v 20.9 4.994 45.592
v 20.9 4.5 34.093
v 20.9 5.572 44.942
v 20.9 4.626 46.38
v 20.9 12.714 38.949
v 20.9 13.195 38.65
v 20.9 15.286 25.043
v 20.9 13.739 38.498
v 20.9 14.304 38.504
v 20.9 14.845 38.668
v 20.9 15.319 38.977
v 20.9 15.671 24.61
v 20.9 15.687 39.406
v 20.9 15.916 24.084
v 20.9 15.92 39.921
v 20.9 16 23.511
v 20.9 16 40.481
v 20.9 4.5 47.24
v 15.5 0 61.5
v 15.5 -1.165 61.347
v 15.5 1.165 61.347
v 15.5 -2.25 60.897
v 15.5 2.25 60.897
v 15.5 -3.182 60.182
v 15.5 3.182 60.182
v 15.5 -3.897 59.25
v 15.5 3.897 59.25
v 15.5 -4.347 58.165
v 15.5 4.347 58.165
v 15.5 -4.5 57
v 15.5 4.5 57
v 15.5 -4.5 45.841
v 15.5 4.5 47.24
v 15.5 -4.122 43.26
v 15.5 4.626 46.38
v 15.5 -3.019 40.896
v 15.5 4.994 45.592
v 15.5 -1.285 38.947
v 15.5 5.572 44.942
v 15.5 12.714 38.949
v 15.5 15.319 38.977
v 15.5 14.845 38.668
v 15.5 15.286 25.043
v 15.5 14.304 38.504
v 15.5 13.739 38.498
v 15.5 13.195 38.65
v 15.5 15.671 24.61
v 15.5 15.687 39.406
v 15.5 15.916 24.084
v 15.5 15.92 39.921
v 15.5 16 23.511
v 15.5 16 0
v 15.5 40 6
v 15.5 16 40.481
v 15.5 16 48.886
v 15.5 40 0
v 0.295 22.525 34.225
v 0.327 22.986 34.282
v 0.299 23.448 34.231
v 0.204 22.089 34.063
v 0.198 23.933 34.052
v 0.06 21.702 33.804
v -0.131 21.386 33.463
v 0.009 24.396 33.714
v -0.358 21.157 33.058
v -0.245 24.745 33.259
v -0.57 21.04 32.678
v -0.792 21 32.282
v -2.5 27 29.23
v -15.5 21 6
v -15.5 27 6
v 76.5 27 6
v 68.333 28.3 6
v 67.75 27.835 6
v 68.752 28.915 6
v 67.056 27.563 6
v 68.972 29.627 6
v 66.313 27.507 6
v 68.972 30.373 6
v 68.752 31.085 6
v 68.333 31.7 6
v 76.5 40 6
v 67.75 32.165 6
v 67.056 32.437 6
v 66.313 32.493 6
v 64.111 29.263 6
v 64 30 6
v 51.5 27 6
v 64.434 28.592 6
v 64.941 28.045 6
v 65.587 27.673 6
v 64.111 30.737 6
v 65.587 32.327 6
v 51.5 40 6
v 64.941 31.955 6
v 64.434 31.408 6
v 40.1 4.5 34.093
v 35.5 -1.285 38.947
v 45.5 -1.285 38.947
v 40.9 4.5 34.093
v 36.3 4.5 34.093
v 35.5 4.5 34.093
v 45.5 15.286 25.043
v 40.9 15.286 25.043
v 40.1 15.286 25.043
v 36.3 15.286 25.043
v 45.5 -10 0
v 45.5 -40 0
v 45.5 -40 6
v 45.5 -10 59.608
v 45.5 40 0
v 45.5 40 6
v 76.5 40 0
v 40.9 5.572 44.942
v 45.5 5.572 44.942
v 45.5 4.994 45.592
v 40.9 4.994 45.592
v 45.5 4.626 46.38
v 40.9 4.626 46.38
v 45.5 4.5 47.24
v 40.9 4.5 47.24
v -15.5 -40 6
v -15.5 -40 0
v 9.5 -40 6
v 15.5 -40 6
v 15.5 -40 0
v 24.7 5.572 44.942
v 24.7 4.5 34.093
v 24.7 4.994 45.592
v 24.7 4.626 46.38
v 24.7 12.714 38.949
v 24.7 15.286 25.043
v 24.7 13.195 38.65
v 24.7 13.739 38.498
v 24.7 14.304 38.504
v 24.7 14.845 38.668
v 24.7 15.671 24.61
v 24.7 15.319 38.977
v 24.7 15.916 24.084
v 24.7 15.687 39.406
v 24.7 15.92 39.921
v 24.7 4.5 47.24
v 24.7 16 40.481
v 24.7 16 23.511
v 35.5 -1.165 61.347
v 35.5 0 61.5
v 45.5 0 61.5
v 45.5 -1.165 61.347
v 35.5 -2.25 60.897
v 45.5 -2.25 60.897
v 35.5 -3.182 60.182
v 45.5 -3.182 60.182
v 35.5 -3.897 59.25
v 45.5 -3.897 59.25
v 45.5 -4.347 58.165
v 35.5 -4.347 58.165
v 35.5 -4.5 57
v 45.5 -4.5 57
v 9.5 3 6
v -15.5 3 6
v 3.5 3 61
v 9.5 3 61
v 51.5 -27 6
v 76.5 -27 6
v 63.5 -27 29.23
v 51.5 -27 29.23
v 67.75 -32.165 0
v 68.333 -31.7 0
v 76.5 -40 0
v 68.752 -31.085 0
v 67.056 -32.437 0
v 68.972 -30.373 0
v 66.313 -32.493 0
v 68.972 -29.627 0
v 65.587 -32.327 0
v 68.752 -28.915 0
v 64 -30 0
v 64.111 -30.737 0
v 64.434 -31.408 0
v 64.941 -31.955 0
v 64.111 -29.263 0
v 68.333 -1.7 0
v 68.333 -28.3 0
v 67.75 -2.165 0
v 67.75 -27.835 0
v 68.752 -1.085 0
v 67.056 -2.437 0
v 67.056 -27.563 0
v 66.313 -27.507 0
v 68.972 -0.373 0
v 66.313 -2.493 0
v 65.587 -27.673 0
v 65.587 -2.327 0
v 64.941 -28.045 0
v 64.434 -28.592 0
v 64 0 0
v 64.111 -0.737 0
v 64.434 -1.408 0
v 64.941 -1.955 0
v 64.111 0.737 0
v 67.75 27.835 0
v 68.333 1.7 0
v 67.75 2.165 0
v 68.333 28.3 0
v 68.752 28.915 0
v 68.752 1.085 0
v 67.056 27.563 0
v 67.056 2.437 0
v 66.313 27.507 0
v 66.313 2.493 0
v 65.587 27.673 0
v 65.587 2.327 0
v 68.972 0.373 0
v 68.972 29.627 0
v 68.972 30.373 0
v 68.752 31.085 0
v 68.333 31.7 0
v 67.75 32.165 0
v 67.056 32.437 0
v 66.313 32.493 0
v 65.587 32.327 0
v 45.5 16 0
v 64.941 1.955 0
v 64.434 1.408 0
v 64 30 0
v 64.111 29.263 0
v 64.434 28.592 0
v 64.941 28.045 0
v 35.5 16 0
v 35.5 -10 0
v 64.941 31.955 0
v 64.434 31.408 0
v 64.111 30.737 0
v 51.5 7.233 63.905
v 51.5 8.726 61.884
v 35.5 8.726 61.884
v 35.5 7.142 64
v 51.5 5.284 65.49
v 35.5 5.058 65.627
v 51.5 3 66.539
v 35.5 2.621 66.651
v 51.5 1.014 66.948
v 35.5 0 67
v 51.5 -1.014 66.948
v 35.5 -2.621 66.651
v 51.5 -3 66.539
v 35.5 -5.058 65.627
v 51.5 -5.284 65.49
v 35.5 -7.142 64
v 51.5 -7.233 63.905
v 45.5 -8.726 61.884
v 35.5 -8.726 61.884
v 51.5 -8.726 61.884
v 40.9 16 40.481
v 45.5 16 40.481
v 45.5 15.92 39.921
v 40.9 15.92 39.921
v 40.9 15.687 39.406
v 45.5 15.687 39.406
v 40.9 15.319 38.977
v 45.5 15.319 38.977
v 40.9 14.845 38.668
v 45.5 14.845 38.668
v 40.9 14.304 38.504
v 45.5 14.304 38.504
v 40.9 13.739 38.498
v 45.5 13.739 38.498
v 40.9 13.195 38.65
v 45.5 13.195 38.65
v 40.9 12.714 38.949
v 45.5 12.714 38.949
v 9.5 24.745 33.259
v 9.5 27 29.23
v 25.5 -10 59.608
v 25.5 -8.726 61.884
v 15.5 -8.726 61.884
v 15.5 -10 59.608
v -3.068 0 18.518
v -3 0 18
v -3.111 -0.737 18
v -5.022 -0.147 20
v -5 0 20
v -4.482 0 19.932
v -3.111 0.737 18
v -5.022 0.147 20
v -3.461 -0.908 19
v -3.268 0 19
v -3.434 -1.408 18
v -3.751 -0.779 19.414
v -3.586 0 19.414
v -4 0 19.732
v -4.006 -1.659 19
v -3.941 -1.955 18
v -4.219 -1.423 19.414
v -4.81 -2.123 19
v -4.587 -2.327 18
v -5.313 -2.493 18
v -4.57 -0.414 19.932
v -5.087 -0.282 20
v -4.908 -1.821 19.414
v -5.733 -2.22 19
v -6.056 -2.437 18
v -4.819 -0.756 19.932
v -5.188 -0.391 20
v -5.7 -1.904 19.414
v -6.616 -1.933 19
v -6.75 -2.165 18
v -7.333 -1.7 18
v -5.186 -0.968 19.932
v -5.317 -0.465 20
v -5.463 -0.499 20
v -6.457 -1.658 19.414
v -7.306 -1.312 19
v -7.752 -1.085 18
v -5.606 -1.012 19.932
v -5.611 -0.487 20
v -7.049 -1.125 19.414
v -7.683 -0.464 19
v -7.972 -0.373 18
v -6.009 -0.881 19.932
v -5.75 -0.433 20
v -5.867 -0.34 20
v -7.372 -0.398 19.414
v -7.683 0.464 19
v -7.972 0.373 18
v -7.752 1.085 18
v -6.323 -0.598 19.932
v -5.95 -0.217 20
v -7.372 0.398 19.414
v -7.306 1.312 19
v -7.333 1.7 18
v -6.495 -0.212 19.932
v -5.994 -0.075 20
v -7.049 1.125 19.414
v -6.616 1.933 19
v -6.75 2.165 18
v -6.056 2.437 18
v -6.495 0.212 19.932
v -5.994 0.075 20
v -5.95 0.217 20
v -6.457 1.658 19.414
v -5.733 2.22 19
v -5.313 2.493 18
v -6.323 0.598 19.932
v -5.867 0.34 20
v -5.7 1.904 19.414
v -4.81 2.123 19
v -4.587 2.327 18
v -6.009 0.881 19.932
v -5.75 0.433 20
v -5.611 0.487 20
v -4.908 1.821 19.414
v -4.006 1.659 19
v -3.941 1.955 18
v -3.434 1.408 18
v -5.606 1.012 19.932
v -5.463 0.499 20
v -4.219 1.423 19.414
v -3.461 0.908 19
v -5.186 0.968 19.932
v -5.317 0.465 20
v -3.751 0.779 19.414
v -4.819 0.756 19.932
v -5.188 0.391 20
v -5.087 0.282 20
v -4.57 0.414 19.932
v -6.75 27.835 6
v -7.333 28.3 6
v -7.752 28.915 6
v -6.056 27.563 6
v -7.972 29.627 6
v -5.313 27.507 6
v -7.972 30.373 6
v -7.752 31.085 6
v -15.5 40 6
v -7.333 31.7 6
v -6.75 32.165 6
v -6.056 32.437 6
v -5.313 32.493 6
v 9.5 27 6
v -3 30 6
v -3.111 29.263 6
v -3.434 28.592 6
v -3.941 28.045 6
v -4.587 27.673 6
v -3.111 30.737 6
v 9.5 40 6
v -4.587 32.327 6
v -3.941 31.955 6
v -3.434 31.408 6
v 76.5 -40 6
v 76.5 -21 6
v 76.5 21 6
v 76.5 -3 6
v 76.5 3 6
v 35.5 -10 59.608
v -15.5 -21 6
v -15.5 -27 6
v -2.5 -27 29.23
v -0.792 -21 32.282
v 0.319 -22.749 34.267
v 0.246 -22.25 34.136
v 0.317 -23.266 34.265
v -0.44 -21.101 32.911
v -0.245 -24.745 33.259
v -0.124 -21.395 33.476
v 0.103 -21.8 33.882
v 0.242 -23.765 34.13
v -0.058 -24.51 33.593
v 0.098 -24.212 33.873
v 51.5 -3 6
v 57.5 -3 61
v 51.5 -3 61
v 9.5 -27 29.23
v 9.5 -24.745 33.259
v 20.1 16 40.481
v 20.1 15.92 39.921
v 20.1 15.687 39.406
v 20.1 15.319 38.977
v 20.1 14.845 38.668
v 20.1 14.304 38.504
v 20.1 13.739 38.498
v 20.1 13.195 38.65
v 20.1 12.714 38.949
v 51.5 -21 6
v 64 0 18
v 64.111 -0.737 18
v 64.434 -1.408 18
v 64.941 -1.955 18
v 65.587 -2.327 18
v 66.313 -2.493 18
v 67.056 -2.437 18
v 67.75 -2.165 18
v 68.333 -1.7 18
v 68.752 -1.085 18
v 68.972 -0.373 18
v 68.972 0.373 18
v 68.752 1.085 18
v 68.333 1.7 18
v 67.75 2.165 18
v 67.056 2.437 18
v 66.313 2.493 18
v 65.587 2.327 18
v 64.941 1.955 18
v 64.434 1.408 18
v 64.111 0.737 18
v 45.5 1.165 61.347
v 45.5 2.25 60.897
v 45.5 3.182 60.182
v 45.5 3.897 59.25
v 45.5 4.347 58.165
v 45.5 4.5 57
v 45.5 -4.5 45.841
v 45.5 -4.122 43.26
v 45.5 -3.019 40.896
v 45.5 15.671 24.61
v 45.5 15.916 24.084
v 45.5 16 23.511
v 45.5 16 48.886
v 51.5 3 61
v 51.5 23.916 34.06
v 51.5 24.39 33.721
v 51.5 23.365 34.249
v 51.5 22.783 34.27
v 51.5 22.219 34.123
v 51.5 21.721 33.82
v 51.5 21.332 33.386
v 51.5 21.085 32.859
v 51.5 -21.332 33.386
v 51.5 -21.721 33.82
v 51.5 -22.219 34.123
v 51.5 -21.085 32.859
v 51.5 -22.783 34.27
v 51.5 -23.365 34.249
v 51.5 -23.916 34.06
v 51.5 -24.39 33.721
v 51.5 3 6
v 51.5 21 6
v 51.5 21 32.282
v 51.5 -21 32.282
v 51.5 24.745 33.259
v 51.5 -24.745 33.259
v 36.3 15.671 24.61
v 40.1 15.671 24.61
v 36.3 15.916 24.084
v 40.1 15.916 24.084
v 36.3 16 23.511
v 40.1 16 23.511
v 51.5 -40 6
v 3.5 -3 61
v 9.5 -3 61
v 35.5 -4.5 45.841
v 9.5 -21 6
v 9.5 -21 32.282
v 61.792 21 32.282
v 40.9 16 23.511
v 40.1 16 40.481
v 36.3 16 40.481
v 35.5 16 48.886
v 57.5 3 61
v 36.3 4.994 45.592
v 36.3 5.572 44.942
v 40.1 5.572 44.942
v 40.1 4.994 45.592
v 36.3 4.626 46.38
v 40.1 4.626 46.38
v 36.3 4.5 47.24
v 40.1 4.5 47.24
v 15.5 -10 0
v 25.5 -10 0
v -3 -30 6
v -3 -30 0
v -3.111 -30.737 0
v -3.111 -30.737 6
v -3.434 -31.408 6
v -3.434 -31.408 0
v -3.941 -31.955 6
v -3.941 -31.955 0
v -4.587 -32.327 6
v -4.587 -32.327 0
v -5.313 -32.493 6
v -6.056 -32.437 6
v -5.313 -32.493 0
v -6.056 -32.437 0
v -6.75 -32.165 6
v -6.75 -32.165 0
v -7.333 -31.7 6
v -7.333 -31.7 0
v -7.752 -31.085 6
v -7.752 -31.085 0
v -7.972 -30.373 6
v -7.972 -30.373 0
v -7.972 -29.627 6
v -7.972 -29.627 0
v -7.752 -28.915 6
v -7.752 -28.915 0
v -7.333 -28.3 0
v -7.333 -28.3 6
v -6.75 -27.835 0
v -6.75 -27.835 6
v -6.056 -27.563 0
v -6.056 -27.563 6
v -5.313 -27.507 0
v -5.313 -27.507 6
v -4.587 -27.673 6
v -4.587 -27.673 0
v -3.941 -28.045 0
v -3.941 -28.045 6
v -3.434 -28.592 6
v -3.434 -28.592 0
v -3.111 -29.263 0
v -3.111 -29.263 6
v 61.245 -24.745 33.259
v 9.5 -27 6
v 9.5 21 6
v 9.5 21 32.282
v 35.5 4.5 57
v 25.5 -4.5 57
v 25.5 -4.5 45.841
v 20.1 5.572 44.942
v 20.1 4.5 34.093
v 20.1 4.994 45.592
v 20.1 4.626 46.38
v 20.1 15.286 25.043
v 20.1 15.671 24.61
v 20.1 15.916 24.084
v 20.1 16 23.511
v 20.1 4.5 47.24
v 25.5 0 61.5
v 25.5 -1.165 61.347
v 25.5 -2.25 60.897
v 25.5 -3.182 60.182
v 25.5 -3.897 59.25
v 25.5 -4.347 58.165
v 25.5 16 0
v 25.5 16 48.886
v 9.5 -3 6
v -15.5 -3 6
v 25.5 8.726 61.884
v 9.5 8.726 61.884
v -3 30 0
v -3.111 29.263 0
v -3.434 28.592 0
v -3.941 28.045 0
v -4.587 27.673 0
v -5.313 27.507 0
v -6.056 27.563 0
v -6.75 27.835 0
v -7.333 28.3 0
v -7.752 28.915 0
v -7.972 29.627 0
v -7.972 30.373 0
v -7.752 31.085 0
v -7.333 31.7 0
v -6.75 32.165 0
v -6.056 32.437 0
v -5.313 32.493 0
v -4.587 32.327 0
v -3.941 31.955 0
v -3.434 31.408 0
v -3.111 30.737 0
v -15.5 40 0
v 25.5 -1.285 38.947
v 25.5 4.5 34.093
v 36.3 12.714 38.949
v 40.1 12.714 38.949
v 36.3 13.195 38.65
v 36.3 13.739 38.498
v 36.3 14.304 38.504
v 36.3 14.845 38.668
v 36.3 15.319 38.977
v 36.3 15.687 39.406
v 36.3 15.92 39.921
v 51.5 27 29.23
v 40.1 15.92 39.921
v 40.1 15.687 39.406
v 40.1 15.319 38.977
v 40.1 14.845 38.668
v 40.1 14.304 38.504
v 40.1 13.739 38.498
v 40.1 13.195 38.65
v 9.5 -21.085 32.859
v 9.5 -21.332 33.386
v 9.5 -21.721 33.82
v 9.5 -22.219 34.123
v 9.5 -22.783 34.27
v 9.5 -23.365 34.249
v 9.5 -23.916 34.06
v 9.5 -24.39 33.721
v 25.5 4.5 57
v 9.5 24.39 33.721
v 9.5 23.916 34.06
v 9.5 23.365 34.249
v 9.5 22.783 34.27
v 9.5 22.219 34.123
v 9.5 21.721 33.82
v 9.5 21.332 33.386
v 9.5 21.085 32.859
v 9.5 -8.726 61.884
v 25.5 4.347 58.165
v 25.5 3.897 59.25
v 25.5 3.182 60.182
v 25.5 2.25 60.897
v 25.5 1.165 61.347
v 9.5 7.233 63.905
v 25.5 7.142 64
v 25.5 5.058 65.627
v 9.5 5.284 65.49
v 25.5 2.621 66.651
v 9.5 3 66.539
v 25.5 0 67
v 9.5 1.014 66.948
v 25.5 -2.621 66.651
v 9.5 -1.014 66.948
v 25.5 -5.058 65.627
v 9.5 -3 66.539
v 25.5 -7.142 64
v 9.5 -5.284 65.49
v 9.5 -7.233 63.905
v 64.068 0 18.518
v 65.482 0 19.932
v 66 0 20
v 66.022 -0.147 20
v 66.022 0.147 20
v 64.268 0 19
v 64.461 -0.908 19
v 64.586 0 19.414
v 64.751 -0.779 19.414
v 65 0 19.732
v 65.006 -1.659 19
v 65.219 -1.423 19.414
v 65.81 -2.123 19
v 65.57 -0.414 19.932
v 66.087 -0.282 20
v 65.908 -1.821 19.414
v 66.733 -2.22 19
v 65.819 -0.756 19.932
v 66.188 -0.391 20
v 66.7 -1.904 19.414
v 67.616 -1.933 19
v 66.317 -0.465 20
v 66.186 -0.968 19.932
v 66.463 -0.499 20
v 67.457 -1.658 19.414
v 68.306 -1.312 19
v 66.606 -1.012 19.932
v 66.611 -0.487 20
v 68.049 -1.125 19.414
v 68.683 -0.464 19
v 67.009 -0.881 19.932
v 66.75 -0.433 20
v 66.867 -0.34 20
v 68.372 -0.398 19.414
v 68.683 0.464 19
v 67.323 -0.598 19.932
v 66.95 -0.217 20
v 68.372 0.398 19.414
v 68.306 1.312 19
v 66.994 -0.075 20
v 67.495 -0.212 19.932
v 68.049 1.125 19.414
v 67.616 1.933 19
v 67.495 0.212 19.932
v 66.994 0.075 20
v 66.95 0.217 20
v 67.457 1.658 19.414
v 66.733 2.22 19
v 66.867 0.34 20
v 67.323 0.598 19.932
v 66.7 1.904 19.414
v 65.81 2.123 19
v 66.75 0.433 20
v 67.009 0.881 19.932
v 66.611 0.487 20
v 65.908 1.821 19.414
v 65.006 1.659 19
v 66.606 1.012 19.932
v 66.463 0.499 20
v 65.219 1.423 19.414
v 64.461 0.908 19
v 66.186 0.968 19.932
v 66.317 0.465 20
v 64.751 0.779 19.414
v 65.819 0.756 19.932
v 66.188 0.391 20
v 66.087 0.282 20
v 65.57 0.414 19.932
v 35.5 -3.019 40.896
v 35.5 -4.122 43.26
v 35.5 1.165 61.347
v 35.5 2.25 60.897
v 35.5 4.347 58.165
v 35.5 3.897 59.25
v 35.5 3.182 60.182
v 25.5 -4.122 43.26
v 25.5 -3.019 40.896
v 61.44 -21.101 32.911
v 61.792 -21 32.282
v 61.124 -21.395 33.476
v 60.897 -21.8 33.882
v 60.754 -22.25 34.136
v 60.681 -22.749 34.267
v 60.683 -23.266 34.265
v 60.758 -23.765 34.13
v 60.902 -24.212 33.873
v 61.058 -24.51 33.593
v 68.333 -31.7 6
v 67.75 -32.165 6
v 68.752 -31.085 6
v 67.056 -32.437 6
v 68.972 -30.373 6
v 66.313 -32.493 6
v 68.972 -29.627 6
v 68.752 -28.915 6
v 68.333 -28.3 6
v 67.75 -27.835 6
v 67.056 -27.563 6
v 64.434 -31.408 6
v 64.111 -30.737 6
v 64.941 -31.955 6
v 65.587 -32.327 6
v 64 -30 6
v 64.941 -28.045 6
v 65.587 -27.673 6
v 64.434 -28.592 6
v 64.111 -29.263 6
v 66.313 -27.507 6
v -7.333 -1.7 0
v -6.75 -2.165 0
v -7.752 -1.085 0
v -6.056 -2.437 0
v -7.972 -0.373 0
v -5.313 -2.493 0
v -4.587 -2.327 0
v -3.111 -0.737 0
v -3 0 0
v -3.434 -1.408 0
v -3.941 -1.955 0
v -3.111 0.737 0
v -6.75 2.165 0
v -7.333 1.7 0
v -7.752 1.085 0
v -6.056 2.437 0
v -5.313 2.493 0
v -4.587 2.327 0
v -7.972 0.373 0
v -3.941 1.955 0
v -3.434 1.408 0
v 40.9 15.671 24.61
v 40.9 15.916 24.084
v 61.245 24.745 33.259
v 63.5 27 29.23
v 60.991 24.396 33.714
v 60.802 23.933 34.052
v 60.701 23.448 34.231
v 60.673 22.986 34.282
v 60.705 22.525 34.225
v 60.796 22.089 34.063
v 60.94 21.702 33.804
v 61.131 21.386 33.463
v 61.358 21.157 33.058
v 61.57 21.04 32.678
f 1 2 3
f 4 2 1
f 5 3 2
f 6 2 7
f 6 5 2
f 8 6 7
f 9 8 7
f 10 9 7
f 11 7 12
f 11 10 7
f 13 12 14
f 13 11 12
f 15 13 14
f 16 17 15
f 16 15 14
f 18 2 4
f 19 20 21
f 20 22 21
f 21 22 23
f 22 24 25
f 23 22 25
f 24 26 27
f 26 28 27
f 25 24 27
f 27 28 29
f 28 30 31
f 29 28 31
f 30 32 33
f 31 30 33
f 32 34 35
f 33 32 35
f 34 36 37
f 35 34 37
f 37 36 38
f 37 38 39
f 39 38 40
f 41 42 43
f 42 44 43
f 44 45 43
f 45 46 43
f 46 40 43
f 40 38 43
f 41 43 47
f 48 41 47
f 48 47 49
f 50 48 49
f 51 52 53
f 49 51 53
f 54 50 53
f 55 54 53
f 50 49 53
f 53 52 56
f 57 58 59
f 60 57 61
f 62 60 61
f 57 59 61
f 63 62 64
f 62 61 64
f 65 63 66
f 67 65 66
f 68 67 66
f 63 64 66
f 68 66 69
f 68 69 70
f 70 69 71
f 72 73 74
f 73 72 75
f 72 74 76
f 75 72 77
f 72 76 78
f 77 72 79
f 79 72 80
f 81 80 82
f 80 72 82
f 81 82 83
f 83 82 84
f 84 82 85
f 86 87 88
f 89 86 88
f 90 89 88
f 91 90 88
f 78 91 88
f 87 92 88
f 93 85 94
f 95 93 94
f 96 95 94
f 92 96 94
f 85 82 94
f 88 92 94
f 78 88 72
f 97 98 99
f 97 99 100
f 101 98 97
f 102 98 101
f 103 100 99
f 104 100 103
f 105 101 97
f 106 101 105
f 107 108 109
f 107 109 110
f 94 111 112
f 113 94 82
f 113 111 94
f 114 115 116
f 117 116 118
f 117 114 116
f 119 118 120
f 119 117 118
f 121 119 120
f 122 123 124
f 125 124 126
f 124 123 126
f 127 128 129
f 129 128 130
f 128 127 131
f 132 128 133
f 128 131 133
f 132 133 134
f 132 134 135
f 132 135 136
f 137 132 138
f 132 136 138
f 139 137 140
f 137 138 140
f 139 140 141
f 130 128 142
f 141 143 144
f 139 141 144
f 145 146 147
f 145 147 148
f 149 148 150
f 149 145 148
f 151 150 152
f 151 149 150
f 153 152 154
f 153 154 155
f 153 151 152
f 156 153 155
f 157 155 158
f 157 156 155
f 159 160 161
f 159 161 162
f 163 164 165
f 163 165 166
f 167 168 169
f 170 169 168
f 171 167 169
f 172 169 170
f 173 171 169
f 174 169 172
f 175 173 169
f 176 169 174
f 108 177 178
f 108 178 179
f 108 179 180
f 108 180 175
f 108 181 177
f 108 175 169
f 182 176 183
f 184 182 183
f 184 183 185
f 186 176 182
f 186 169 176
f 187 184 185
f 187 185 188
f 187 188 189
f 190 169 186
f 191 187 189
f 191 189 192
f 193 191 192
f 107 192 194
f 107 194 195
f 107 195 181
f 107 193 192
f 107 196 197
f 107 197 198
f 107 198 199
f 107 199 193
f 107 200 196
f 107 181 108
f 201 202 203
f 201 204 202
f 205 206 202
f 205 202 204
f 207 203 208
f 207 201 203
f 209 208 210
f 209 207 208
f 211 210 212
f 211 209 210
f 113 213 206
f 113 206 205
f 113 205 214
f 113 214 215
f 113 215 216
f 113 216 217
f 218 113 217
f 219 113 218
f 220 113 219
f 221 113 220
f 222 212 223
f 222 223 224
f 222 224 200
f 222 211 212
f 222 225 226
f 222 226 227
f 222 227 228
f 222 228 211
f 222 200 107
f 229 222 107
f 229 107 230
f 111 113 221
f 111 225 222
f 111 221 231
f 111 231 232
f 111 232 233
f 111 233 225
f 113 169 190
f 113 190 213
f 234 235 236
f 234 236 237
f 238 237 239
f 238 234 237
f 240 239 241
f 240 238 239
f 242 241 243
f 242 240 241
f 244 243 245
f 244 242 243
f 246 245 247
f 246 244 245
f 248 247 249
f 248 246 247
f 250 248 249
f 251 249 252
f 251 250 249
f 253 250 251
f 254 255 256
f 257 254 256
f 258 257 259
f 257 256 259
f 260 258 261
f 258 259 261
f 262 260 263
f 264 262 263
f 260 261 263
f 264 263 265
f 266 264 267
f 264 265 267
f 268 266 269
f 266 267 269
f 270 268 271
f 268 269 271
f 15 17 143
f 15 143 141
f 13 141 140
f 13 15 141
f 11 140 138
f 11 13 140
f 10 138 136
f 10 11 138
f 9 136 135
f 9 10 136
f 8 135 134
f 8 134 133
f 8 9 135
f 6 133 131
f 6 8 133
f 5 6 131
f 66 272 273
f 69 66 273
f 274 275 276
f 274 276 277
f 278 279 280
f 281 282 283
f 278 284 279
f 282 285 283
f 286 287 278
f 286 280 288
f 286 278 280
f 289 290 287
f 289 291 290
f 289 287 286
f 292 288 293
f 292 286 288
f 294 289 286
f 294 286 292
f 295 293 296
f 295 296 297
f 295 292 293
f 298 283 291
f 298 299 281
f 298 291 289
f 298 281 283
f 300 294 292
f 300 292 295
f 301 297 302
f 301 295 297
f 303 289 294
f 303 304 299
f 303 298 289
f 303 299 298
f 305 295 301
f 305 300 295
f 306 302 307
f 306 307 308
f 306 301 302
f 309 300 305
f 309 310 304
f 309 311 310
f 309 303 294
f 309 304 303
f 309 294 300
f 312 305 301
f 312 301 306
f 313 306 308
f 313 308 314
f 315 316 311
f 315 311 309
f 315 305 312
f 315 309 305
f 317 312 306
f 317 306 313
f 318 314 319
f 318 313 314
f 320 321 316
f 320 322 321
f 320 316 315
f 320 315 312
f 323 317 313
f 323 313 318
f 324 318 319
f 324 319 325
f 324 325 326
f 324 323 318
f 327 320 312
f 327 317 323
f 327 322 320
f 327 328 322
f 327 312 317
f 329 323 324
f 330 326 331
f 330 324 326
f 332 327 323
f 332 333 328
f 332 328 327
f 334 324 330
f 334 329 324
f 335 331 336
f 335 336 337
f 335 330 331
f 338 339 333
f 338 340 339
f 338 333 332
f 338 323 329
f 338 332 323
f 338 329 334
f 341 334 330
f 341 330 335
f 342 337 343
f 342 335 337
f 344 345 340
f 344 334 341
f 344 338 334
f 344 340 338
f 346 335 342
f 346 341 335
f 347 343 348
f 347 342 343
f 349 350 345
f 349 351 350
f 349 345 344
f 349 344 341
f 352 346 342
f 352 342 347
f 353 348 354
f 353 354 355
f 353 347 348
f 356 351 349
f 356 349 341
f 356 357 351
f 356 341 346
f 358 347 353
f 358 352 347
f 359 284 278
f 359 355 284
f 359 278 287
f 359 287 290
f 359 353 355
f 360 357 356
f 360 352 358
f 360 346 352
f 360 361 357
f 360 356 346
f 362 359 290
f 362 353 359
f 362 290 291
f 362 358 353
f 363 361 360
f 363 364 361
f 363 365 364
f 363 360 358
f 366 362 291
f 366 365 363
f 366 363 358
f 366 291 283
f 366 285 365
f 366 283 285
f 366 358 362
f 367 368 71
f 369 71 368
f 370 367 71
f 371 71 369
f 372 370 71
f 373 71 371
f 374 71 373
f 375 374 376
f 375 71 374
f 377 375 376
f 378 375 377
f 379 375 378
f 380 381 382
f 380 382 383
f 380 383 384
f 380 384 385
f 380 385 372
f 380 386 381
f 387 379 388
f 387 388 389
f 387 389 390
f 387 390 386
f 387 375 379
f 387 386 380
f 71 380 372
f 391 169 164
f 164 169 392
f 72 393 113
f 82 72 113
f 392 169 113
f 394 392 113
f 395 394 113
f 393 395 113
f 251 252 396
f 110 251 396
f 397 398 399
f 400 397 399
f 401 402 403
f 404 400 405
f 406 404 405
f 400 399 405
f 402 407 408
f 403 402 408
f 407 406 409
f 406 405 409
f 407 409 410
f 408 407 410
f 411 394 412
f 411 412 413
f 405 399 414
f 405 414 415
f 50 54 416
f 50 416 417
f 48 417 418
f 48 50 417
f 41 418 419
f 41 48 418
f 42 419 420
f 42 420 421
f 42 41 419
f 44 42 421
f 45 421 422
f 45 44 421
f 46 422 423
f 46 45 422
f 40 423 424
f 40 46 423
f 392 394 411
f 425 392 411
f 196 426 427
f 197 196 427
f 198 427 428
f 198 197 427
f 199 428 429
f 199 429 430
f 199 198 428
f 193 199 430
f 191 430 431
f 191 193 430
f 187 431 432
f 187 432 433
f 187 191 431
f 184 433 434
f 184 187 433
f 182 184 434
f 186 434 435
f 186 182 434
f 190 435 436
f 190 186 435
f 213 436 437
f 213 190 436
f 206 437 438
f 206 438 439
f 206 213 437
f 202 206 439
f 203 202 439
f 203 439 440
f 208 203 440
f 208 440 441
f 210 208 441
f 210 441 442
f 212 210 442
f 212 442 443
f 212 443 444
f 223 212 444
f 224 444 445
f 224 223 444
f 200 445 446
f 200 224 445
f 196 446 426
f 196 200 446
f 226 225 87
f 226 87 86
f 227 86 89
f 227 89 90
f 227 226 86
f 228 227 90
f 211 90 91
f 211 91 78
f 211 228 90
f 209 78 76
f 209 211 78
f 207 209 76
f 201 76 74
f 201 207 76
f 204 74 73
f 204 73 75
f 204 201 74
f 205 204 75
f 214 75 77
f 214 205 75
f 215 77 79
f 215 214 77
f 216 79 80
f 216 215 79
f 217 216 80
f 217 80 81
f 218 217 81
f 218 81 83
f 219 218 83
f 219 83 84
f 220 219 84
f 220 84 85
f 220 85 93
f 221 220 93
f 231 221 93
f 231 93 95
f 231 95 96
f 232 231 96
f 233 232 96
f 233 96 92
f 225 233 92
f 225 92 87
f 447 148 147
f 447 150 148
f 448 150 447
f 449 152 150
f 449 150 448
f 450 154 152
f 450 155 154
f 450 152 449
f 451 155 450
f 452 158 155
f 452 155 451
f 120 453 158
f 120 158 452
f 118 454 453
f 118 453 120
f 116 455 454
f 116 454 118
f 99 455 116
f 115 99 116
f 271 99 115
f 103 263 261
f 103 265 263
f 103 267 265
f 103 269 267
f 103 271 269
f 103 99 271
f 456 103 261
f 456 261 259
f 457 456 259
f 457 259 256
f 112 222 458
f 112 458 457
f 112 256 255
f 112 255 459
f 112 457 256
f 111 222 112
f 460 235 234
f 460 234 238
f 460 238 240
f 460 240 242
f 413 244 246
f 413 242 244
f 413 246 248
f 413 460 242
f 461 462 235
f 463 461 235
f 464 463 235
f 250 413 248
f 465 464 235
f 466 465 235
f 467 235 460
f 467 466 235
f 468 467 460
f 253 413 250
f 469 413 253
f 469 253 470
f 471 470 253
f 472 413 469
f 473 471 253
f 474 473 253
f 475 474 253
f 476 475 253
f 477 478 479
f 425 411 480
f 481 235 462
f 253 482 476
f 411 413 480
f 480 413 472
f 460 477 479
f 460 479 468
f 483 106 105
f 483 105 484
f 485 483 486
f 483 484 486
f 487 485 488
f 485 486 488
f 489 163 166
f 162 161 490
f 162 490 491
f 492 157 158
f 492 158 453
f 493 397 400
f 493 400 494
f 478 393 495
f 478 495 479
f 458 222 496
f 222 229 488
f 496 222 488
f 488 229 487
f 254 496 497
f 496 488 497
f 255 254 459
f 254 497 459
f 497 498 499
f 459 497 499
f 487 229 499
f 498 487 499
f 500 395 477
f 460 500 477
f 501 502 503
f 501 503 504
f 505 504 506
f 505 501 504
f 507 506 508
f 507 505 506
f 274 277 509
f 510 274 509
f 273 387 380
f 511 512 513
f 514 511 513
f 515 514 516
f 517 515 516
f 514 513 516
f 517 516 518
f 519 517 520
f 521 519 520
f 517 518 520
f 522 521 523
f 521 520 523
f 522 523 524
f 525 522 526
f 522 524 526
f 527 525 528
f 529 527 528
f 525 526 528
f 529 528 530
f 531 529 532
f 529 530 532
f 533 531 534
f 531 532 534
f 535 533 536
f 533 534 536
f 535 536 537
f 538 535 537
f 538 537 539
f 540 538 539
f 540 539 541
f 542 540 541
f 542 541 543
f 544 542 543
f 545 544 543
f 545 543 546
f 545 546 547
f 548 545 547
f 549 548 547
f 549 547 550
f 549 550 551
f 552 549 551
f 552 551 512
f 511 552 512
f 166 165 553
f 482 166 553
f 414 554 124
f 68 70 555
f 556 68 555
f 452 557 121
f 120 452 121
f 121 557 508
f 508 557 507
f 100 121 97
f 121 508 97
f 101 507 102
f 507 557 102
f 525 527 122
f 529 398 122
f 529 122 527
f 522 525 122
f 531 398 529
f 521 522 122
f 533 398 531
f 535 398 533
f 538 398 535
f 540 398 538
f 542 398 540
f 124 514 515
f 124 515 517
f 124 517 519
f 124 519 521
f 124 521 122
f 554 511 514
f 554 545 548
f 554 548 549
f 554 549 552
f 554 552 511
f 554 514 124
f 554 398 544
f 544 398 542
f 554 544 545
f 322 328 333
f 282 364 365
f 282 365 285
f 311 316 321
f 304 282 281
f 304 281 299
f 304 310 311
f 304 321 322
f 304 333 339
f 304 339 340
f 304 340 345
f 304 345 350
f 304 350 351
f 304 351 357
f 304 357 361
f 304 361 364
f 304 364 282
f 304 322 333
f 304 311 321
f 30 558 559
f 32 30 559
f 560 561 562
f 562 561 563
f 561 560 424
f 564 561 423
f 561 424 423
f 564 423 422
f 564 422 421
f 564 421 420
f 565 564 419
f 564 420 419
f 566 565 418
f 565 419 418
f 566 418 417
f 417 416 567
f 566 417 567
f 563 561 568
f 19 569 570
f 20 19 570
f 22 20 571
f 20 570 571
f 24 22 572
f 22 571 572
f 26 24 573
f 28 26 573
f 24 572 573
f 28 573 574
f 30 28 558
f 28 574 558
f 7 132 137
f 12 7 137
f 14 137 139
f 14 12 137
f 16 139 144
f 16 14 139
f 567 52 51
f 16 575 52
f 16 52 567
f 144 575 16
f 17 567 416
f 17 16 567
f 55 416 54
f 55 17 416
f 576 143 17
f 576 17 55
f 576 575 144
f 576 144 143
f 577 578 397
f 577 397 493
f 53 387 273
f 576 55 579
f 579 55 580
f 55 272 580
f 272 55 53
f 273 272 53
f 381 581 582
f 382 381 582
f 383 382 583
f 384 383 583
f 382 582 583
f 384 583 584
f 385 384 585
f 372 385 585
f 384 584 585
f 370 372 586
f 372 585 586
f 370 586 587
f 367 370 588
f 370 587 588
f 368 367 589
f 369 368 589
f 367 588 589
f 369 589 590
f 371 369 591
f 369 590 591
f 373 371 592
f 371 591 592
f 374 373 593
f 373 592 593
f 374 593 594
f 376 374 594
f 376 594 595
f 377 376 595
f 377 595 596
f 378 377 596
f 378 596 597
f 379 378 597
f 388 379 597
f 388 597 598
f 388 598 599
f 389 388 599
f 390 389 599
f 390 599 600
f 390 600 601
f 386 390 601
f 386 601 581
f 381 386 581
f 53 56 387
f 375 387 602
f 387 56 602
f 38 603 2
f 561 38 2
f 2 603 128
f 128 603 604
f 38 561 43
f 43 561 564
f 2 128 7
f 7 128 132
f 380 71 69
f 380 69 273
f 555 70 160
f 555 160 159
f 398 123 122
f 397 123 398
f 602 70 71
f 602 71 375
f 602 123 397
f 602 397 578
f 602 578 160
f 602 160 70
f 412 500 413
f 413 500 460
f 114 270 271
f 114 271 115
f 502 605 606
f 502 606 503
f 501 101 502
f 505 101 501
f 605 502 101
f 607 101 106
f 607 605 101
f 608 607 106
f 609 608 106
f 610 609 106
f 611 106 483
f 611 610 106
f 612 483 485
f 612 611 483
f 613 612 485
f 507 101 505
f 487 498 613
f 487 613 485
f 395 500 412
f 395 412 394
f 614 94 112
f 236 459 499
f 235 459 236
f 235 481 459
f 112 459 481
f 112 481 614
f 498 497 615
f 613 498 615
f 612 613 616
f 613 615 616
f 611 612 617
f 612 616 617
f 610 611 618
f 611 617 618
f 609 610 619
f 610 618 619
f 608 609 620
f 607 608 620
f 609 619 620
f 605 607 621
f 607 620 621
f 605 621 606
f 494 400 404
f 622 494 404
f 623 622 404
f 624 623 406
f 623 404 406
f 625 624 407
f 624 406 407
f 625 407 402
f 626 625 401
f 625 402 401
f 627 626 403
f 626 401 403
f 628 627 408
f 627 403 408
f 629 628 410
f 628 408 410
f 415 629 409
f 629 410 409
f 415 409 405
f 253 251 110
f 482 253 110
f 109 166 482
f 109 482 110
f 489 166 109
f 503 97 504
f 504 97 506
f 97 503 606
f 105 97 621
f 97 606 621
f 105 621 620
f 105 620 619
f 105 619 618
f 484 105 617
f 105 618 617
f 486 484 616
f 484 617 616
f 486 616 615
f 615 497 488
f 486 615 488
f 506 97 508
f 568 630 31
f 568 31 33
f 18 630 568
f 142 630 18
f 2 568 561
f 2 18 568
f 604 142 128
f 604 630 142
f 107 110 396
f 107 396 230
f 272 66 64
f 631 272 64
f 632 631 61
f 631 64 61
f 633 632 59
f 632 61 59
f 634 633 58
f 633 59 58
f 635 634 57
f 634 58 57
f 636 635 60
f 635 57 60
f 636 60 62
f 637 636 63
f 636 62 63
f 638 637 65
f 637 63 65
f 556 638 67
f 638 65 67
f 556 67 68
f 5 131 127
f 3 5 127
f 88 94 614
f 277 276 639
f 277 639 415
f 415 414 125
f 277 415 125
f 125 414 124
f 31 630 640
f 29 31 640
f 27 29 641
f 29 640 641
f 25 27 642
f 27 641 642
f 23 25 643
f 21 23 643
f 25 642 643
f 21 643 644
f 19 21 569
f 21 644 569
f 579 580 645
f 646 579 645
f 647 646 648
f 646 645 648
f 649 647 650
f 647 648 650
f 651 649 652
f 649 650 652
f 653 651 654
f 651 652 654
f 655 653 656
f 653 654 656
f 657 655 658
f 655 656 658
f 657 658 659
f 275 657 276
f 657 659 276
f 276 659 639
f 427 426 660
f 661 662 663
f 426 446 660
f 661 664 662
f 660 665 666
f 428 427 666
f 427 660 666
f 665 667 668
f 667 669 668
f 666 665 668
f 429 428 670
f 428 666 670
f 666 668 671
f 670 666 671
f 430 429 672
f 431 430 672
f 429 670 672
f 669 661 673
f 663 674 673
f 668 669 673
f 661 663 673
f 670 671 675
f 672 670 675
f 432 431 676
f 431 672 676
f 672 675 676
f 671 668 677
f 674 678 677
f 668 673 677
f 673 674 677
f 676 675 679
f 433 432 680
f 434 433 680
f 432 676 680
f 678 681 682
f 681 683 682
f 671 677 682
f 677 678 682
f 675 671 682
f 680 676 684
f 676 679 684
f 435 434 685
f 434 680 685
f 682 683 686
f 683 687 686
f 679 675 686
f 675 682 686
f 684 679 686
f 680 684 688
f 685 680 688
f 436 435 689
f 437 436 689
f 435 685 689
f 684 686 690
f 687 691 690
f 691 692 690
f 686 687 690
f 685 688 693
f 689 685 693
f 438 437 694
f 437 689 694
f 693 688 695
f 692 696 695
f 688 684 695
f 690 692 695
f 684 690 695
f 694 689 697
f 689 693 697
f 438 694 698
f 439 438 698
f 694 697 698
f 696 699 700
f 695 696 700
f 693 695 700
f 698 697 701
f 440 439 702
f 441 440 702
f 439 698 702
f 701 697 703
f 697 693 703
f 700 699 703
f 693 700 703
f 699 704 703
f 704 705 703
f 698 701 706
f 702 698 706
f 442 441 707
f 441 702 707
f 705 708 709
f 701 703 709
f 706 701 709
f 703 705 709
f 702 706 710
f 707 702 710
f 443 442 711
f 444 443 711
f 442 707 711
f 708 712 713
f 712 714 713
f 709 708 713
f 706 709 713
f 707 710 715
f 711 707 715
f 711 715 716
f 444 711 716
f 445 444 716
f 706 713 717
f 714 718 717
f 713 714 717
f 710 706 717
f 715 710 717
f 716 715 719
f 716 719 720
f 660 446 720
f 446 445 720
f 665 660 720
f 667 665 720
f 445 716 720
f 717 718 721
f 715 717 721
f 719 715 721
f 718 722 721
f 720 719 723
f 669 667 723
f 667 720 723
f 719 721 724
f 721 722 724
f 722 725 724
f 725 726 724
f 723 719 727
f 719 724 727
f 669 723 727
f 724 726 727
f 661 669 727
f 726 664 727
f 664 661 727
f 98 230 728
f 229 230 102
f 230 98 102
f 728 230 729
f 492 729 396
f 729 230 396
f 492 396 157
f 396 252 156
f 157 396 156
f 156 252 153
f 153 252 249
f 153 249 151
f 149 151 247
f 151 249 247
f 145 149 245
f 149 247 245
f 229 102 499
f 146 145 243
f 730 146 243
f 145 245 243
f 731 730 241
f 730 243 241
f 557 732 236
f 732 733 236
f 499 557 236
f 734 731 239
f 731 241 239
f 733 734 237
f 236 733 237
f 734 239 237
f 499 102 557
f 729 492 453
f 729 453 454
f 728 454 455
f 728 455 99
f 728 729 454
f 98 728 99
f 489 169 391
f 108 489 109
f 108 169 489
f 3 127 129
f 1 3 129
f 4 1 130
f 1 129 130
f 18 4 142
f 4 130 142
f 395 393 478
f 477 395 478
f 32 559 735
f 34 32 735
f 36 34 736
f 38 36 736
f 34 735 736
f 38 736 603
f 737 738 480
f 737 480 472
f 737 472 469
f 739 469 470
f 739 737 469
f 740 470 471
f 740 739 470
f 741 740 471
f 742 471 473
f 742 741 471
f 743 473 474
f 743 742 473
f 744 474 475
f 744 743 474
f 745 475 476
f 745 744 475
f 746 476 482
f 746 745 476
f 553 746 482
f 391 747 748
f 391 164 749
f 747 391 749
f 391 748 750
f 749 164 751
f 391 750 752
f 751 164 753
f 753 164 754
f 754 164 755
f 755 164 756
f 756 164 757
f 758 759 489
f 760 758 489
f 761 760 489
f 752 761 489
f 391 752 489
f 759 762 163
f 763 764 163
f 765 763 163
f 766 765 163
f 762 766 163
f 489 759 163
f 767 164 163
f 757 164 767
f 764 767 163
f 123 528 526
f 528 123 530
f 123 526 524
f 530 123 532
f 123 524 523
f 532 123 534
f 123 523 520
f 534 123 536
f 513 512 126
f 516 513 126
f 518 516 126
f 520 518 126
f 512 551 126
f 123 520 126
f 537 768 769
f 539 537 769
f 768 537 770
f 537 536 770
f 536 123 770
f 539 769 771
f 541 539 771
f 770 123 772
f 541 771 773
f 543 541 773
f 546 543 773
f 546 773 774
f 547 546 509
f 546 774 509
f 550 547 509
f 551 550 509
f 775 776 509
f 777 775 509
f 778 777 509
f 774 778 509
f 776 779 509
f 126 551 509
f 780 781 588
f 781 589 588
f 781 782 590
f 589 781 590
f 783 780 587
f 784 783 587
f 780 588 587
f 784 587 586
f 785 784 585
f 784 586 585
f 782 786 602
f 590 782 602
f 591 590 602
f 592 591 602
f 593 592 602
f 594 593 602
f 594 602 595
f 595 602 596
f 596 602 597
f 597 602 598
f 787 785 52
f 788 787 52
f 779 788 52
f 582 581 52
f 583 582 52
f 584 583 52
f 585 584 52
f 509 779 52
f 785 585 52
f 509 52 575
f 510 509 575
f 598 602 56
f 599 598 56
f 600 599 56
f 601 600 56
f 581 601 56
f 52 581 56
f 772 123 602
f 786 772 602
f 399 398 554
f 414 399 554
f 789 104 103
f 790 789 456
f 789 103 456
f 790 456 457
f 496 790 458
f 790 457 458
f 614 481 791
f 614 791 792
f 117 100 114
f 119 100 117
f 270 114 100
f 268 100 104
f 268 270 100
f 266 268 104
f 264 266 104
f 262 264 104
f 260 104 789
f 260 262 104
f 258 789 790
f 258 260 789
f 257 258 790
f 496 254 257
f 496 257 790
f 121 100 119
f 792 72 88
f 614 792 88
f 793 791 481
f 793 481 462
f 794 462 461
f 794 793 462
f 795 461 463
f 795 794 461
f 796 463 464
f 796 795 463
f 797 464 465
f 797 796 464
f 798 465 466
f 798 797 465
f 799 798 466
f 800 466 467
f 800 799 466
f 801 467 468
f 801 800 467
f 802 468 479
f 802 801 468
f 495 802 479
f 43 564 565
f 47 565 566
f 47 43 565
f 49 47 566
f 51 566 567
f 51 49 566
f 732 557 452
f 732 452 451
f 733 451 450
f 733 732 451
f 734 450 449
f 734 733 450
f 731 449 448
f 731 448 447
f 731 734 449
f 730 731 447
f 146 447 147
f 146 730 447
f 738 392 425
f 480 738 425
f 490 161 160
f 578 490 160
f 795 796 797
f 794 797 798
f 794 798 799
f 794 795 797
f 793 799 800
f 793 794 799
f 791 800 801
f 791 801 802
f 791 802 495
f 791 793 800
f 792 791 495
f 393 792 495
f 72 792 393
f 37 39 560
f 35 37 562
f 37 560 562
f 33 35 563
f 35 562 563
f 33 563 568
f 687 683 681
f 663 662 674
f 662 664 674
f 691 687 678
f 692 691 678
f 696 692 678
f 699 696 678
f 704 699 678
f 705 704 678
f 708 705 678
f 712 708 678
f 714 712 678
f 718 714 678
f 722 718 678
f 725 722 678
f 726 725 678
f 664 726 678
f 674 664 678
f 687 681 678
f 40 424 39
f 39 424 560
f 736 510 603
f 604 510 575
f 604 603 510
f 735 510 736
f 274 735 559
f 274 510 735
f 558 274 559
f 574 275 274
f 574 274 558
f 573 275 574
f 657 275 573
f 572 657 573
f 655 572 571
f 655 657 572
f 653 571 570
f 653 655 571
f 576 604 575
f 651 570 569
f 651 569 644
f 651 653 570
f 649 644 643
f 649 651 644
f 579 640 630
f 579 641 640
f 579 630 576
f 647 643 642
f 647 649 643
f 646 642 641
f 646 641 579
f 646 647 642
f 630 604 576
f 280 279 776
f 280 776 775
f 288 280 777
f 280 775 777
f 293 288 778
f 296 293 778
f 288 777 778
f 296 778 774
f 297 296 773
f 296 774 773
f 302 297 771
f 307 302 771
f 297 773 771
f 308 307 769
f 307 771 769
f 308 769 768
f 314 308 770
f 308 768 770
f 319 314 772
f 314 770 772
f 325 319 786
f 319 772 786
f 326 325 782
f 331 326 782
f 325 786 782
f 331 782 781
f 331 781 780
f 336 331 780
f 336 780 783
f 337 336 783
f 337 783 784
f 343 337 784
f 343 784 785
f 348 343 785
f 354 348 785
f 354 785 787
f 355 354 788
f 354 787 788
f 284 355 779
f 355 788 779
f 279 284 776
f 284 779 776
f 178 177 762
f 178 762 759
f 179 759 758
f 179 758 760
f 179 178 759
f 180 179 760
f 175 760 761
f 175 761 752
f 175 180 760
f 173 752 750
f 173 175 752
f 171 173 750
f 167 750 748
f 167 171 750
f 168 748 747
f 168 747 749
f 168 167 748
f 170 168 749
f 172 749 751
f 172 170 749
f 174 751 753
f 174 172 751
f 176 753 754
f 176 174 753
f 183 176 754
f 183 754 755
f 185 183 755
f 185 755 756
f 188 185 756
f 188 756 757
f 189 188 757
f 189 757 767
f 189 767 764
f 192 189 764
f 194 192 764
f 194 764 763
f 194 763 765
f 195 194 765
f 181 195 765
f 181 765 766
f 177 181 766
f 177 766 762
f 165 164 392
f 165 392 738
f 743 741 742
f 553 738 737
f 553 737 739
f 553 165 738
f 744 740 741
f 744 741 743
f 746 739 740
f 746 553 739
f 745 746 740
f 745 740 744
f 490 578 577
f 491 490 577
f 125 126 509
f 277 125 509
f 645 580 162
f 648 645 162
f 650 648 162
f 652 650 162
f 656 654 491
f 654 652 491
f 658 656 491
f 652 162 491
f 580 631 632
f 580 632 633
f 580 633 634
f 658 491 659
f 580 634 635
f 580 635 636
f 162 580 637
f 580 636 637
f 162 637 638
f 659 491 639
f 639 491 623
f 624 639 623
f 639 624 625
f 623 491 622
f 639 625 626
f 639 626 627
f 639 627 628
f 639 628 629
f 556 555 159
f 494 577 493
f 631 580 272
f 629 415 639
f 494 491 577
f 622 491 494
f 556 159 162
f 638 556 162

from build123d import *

# Parameters (mm, degrees)
F1_DEPTH       = 6
F3_DEPTH       = 61
F5_DEPTH       = 25
F6_W           = 25
F6_H           = 6
F7_DEPTH       = 55
F9_DEPTH       = 66
F11_DEPTH      = 10
F13_DEPTH      = 10
F14_R          = 2
F17_DEPTH      = 0.4
F17_DEPTH_BACK = 0.4
F19_DEPTH      = 0.8
F20_R          = 2.5
F21_DEPTH      = 20
F22_R          = 2
F24_DEPTH      = 14.1
F26_DEPTH      = 9.9
F28_DEPTH      = 6.1
F29_T1_DEPTH   = 25.1731750977


# Not quite as in the source:
# - a fillet or chamfer that OpenCascade refuses, or shapes differently, is made with other operations: its cross-section is extruded or revolved along the edge and cut away or added


with BuildPart() as f1:
    # F0 (on Top) → F1 (new body)
    with BuildSketch(Plane.XY):
        Polygon((15.5, 40), (-15.5, 40), (-15.5, -40), (15.5, -40), (15.5, -10), (25.5, -10), (25.5, 16), (15.5, 16), align=None)
    extrude(amount=F1_DEPTH)

    # F2 (on face) → F3 (join)
    with BuildSketch(Plane.XY.offset(6)):
        Polygon((15.5, 16), (15.5, 40), (9.5, 40), (9.5, -40), (15.5, -40), (15.5, -10), align=None)
    extrude(amount=F3_DEPTH)

    # F4 (on face) → F5 (cut)
    with BuildSketch(Plane(origin=(9.5, 0, 0), x_dir=(0, -1, 0), z_dir=(-1, 0, 0))):
        with BuildLine():
            ThreePointArc((-8.7264736489, 61.8835087442), (0, 67), (8.7264736489, 61.8835087442))
            Line((8.7264736489, 61.8835087442), (40, 6))
            Line((40, 6), (42.4536168575, 71.3308081031))
            Line((42.4536168575, 71.3308081031), (-55.2879087627, 71.3308081031))
            Line((-55.2879087627, 71.3308081031), (-55.2879087627, 6))
            Line((-55.2879087627, 6), (-40, 6))
            Line((-40, 6), (-8.7264736489, 61.8835087442))
        make_face()
    extrude(amount=-F5_DEPTH, mode=Mode.SUBTRACT)

    # F6 (on face) → F7 (join)
    with BuildSketch(Plane.XY.offset(6)):
        with Locations((-3, 0)):
            Rectangle(F6_W, F6_H)
        with Locations((-3, -24)):
            Rectangle(F6_W, F6_H)
        with Locations((-3, 24)):
            Rectangle(F6_W, F6_H)
    extrude(amount=F7_DEPTH)

    # F8 (on face) → F9 (cut)
    with BuildSketch(Plane.YZ.offset(9.5)):
        with BuildLine():
            Line((-71.4004188776, 87.6169577241), (-40, 6))
            Line((-40, 6), (-27, 29.2300510508))
            Line((-27, 29.2300510508), (-21, 39.9516130743))
            Line((-21, 39.9516130743), (-8.7264736489, 61.8835087442))
            ThreePointArc((-8.7264736489, 61.8835087442), (-6.3084751181, 64.7590683516), (-3, 66.5393920142))
            ThreePointArc((-3, 66.5393920142), (0, 67), (3, 66.5393920142))
            ThreePointArc((3, 66.5393920142), (6.3084751181, 64.7590683516), (8.7264736489, 61.8835087442))
            Line((8.7264736489, 61.8835087442), (21, 39.9516130743))
            Line((21, 39.9516130743), (27, 29.2300510508))
            Line((27, 29.2300510508), (40, 6))
            Line((40, 6), (67.9079666734, 87.6169577241))
            Line((67.9079666734, 87.6169577241), (-71.4004188776, 87.6169577241))
        make_face()
    extrude(amount=-F9_DEPTH, mode=Mode.SUBTRACT)

    # F10 (on face) → F11 (join, through all)
    with BuildSketch(Plane.YZ.offset(15.5)):
        with BuildLine():
            Line((-10, 59.6078101173), (-10, 6))
            Line((-10, 6), (16, 6))
            Line((16, 6), (16, 48.8862480938))
            Line((16, 48.8862480938), (8.7264736489, 61.8835087442))
            ThreePointArc((8.7264736489, 61.8835087442), (0, 67), (-8.7264736489, 61.8835087442))
            Line((-8.7264736489, 61.8835087442), (-10, 59.6078101173))
        make_face()
    extrude(amount=F11_DEPTH)

    # F12 (on face) → F13 (cut, through all)
    with BuildSketch(Plane.YZ.offset(25.5)):
        with BuildLine():
            ThreePointArc((0, 61.5), (-3.1819805153, 60.1819805153), (-4.5, 57))
            Line((-4.5, 57), (-4.5, 45.8414354094))
            ThreePointArc((-4.5, 45.8414354094), (-3.6567700833, 42.0378710538), (-1.2850884872, 38.9470354214))
            Line((-1.2850884872, 38.9470354214), (16, 24.4431240469))
            Line((16, 24.4431240469), (16, 36.1917896509))
            Line((16, 36.1917896509), (5.5716371709, 44.9422250545))
            ThreePointArc((5.5716371709, 44.9422250545), (4.7810766389, 45.9725035987), (4.5, 47.2403583839))
            Line((4.5, 47.2403583839), (4.5, 57))
            ThreePointArc((4.5, 57), (3.1819805153, 60.1819805153), (0, 61.5))
        make_face()
    extrude(amount=-F13_DEPTH, mode=Mode.SUBTRACT)

    # F14
    f14_edges = [f1.edges().sort_by_distance(p)[0] for p in [
        (20.5, 16, 36.19179),
        (20.5, 16, 24.443124),
    ]]
    fillet(f14_edges, radius=F14_R)

    # F16 (on offset) → F17 (join, two sides)
    with BuildSketch(Plane.YZ.offset(20.5)) as f17_sk:
        Polygon((16, 40.4808034919), (4.5, 50.1304492505), (4.5, 33.1601544891), (16, 23.5105087306), align=None)
    extrude(amount=F17_DEPTH)
    extrude(f17_sk.sketch, amount=-F17_DEPTH_BACK)

    # F18 (on face) → F19 (join)
    with BuildSketch(Plane.YZ.offset(25.5)):
        with BuildLine():
            ThreePointArc((16, 40.4808034919), (14.8452365235, 38.6681879179), (12.7144247806, 38.9487146057))
            Line((12.7144247806, 38.9487146057), (5.5716371709, 44.9422250545))
            ThreePointArc((5.5716371709, 44.9422250545), (4.7810766389, 45.9725035987), (4.5, 47.2403583839))
            Line((4.5, 47.2403583839), (4.5, 34.0927698054))
            Line((4.5, 34.0927698054), (15.2855752194, 25.0425976168))
            ThreePointArc((15.2855752194, 25.0425976168), (15.8126155741, 24.3557452541), (16, 23.5105087306))
            Line((16, 23.5105087306), (16, 40.4808034919))
        make_face()
    extrude(amount=-F19_DEPTH)

    # F20 (on face) → F21 (cut)
    with BuildSketch(Plane(origin=(0, 0, 0), x_dir=(1, 0, 0), z_dir=(0, 0, -1))):
        with Locations((-5.5, 0)):
            Circle(F20_R)
        with Locations((-5.5, 30)):
            Circle(F20_R)
        with Locations((-5.5, -30)):
            Circle(F20_R)
    extrude(amount=-F21_DEPTH, mode=Mode.SUBTRACT)

    # F22
    f22_edges = [f1.edges().sort_by_distance(p)[0] for p in [
        (-8, 0, 20),
    ]]
    fillet(f22_edges, radius=F22_R)

    # F23 (on face) → F24 (cut)
    with BuildSketch(Plane.XZ.offset(27)):
        Polygon((3.5, 39.9516130743), (9.5, 39.9516130743), (9.5, 46.4005209506), (-37.9068218172, 46.4005209506), (-37.9068218172, 6), (-15.5, 6), align=None)
    extrude(amount=-F24_DEPTH, mode=Mode.SUBTRACT)

    # F25 (on face) → F26 (cut)
    with BuildSketch(Plane(origin=(0, 27, 0), x_dir=(-1, 0, 0), z_dir=(0, 1, 0))):
        Polygon((-9.5, 49.5710298419), (-9.5, 39.9516130743), (-3.5, 39.9516130743), (15.5, 6), (21.0043340921, 6), (21.0043340921, 49.5710298419), align=None)
    extrude(amount=-F26_DEPTH, mode=Mode.SUBTRACT)

    # F27 (on face) → F28 (cut)
    with BuildSketch(Plane(origin=(0, 3, 0), x_dir=(-1, 0, 0), z_dir=(0, 1, 0))):
        Polygon((-9.5, 63.8725236058), (-9.5, 61), (-3.5, 61), (15.5, 6), (33.5027240217, 48.3329854906), (22.2862139344, 65.7419413328), align=None)
    extrude(amount=-F28_DEPTH, mode=Mode.SUBTRACT)

    # F29: fillet of radius 2 on 2 edges, made by hand

    # F29_s2 → F29_t1 (cut)
    with BuildSketch(Plane.YZ.offset(-15.6731750977)):
        with BuildLine():
            ThreePointArc((24.7452947298, 33.259044784), (22.4953166634, 34.2176194314), (21, 32.2823430352))
            Line((21, 32.2823430352), (21, 39.9516130743))
            Line((21, 39.9516130743), (24.7452947298, 33.259044784))
        make_face()
        with BuildLine():
            ThreePointArc((-21, 32.2823430352), (-22.4953166634, 34.2176194314), (-24.7452947298, 33.259044784))
            Line((-24.7452947298, 33.259044784), (-21, 39.9516130743))
            Line((-21, 39.9516130743), (-21, 32.2823430352))
        make_face()
    extrude(amount=F29_T1_DEPTH, mode=Mode.SUBTRACT)


with BuildPart() as f31_1:
    # F31: instance of F1
    add(f1.part.mirror(Plane(origin=(30.5, 2.9102814818, 28.9120815195), x_dir=(0, 1, 0), z_dir=(1, 0, 0))))


solid = Compound([f1.part, f31_1.part])
